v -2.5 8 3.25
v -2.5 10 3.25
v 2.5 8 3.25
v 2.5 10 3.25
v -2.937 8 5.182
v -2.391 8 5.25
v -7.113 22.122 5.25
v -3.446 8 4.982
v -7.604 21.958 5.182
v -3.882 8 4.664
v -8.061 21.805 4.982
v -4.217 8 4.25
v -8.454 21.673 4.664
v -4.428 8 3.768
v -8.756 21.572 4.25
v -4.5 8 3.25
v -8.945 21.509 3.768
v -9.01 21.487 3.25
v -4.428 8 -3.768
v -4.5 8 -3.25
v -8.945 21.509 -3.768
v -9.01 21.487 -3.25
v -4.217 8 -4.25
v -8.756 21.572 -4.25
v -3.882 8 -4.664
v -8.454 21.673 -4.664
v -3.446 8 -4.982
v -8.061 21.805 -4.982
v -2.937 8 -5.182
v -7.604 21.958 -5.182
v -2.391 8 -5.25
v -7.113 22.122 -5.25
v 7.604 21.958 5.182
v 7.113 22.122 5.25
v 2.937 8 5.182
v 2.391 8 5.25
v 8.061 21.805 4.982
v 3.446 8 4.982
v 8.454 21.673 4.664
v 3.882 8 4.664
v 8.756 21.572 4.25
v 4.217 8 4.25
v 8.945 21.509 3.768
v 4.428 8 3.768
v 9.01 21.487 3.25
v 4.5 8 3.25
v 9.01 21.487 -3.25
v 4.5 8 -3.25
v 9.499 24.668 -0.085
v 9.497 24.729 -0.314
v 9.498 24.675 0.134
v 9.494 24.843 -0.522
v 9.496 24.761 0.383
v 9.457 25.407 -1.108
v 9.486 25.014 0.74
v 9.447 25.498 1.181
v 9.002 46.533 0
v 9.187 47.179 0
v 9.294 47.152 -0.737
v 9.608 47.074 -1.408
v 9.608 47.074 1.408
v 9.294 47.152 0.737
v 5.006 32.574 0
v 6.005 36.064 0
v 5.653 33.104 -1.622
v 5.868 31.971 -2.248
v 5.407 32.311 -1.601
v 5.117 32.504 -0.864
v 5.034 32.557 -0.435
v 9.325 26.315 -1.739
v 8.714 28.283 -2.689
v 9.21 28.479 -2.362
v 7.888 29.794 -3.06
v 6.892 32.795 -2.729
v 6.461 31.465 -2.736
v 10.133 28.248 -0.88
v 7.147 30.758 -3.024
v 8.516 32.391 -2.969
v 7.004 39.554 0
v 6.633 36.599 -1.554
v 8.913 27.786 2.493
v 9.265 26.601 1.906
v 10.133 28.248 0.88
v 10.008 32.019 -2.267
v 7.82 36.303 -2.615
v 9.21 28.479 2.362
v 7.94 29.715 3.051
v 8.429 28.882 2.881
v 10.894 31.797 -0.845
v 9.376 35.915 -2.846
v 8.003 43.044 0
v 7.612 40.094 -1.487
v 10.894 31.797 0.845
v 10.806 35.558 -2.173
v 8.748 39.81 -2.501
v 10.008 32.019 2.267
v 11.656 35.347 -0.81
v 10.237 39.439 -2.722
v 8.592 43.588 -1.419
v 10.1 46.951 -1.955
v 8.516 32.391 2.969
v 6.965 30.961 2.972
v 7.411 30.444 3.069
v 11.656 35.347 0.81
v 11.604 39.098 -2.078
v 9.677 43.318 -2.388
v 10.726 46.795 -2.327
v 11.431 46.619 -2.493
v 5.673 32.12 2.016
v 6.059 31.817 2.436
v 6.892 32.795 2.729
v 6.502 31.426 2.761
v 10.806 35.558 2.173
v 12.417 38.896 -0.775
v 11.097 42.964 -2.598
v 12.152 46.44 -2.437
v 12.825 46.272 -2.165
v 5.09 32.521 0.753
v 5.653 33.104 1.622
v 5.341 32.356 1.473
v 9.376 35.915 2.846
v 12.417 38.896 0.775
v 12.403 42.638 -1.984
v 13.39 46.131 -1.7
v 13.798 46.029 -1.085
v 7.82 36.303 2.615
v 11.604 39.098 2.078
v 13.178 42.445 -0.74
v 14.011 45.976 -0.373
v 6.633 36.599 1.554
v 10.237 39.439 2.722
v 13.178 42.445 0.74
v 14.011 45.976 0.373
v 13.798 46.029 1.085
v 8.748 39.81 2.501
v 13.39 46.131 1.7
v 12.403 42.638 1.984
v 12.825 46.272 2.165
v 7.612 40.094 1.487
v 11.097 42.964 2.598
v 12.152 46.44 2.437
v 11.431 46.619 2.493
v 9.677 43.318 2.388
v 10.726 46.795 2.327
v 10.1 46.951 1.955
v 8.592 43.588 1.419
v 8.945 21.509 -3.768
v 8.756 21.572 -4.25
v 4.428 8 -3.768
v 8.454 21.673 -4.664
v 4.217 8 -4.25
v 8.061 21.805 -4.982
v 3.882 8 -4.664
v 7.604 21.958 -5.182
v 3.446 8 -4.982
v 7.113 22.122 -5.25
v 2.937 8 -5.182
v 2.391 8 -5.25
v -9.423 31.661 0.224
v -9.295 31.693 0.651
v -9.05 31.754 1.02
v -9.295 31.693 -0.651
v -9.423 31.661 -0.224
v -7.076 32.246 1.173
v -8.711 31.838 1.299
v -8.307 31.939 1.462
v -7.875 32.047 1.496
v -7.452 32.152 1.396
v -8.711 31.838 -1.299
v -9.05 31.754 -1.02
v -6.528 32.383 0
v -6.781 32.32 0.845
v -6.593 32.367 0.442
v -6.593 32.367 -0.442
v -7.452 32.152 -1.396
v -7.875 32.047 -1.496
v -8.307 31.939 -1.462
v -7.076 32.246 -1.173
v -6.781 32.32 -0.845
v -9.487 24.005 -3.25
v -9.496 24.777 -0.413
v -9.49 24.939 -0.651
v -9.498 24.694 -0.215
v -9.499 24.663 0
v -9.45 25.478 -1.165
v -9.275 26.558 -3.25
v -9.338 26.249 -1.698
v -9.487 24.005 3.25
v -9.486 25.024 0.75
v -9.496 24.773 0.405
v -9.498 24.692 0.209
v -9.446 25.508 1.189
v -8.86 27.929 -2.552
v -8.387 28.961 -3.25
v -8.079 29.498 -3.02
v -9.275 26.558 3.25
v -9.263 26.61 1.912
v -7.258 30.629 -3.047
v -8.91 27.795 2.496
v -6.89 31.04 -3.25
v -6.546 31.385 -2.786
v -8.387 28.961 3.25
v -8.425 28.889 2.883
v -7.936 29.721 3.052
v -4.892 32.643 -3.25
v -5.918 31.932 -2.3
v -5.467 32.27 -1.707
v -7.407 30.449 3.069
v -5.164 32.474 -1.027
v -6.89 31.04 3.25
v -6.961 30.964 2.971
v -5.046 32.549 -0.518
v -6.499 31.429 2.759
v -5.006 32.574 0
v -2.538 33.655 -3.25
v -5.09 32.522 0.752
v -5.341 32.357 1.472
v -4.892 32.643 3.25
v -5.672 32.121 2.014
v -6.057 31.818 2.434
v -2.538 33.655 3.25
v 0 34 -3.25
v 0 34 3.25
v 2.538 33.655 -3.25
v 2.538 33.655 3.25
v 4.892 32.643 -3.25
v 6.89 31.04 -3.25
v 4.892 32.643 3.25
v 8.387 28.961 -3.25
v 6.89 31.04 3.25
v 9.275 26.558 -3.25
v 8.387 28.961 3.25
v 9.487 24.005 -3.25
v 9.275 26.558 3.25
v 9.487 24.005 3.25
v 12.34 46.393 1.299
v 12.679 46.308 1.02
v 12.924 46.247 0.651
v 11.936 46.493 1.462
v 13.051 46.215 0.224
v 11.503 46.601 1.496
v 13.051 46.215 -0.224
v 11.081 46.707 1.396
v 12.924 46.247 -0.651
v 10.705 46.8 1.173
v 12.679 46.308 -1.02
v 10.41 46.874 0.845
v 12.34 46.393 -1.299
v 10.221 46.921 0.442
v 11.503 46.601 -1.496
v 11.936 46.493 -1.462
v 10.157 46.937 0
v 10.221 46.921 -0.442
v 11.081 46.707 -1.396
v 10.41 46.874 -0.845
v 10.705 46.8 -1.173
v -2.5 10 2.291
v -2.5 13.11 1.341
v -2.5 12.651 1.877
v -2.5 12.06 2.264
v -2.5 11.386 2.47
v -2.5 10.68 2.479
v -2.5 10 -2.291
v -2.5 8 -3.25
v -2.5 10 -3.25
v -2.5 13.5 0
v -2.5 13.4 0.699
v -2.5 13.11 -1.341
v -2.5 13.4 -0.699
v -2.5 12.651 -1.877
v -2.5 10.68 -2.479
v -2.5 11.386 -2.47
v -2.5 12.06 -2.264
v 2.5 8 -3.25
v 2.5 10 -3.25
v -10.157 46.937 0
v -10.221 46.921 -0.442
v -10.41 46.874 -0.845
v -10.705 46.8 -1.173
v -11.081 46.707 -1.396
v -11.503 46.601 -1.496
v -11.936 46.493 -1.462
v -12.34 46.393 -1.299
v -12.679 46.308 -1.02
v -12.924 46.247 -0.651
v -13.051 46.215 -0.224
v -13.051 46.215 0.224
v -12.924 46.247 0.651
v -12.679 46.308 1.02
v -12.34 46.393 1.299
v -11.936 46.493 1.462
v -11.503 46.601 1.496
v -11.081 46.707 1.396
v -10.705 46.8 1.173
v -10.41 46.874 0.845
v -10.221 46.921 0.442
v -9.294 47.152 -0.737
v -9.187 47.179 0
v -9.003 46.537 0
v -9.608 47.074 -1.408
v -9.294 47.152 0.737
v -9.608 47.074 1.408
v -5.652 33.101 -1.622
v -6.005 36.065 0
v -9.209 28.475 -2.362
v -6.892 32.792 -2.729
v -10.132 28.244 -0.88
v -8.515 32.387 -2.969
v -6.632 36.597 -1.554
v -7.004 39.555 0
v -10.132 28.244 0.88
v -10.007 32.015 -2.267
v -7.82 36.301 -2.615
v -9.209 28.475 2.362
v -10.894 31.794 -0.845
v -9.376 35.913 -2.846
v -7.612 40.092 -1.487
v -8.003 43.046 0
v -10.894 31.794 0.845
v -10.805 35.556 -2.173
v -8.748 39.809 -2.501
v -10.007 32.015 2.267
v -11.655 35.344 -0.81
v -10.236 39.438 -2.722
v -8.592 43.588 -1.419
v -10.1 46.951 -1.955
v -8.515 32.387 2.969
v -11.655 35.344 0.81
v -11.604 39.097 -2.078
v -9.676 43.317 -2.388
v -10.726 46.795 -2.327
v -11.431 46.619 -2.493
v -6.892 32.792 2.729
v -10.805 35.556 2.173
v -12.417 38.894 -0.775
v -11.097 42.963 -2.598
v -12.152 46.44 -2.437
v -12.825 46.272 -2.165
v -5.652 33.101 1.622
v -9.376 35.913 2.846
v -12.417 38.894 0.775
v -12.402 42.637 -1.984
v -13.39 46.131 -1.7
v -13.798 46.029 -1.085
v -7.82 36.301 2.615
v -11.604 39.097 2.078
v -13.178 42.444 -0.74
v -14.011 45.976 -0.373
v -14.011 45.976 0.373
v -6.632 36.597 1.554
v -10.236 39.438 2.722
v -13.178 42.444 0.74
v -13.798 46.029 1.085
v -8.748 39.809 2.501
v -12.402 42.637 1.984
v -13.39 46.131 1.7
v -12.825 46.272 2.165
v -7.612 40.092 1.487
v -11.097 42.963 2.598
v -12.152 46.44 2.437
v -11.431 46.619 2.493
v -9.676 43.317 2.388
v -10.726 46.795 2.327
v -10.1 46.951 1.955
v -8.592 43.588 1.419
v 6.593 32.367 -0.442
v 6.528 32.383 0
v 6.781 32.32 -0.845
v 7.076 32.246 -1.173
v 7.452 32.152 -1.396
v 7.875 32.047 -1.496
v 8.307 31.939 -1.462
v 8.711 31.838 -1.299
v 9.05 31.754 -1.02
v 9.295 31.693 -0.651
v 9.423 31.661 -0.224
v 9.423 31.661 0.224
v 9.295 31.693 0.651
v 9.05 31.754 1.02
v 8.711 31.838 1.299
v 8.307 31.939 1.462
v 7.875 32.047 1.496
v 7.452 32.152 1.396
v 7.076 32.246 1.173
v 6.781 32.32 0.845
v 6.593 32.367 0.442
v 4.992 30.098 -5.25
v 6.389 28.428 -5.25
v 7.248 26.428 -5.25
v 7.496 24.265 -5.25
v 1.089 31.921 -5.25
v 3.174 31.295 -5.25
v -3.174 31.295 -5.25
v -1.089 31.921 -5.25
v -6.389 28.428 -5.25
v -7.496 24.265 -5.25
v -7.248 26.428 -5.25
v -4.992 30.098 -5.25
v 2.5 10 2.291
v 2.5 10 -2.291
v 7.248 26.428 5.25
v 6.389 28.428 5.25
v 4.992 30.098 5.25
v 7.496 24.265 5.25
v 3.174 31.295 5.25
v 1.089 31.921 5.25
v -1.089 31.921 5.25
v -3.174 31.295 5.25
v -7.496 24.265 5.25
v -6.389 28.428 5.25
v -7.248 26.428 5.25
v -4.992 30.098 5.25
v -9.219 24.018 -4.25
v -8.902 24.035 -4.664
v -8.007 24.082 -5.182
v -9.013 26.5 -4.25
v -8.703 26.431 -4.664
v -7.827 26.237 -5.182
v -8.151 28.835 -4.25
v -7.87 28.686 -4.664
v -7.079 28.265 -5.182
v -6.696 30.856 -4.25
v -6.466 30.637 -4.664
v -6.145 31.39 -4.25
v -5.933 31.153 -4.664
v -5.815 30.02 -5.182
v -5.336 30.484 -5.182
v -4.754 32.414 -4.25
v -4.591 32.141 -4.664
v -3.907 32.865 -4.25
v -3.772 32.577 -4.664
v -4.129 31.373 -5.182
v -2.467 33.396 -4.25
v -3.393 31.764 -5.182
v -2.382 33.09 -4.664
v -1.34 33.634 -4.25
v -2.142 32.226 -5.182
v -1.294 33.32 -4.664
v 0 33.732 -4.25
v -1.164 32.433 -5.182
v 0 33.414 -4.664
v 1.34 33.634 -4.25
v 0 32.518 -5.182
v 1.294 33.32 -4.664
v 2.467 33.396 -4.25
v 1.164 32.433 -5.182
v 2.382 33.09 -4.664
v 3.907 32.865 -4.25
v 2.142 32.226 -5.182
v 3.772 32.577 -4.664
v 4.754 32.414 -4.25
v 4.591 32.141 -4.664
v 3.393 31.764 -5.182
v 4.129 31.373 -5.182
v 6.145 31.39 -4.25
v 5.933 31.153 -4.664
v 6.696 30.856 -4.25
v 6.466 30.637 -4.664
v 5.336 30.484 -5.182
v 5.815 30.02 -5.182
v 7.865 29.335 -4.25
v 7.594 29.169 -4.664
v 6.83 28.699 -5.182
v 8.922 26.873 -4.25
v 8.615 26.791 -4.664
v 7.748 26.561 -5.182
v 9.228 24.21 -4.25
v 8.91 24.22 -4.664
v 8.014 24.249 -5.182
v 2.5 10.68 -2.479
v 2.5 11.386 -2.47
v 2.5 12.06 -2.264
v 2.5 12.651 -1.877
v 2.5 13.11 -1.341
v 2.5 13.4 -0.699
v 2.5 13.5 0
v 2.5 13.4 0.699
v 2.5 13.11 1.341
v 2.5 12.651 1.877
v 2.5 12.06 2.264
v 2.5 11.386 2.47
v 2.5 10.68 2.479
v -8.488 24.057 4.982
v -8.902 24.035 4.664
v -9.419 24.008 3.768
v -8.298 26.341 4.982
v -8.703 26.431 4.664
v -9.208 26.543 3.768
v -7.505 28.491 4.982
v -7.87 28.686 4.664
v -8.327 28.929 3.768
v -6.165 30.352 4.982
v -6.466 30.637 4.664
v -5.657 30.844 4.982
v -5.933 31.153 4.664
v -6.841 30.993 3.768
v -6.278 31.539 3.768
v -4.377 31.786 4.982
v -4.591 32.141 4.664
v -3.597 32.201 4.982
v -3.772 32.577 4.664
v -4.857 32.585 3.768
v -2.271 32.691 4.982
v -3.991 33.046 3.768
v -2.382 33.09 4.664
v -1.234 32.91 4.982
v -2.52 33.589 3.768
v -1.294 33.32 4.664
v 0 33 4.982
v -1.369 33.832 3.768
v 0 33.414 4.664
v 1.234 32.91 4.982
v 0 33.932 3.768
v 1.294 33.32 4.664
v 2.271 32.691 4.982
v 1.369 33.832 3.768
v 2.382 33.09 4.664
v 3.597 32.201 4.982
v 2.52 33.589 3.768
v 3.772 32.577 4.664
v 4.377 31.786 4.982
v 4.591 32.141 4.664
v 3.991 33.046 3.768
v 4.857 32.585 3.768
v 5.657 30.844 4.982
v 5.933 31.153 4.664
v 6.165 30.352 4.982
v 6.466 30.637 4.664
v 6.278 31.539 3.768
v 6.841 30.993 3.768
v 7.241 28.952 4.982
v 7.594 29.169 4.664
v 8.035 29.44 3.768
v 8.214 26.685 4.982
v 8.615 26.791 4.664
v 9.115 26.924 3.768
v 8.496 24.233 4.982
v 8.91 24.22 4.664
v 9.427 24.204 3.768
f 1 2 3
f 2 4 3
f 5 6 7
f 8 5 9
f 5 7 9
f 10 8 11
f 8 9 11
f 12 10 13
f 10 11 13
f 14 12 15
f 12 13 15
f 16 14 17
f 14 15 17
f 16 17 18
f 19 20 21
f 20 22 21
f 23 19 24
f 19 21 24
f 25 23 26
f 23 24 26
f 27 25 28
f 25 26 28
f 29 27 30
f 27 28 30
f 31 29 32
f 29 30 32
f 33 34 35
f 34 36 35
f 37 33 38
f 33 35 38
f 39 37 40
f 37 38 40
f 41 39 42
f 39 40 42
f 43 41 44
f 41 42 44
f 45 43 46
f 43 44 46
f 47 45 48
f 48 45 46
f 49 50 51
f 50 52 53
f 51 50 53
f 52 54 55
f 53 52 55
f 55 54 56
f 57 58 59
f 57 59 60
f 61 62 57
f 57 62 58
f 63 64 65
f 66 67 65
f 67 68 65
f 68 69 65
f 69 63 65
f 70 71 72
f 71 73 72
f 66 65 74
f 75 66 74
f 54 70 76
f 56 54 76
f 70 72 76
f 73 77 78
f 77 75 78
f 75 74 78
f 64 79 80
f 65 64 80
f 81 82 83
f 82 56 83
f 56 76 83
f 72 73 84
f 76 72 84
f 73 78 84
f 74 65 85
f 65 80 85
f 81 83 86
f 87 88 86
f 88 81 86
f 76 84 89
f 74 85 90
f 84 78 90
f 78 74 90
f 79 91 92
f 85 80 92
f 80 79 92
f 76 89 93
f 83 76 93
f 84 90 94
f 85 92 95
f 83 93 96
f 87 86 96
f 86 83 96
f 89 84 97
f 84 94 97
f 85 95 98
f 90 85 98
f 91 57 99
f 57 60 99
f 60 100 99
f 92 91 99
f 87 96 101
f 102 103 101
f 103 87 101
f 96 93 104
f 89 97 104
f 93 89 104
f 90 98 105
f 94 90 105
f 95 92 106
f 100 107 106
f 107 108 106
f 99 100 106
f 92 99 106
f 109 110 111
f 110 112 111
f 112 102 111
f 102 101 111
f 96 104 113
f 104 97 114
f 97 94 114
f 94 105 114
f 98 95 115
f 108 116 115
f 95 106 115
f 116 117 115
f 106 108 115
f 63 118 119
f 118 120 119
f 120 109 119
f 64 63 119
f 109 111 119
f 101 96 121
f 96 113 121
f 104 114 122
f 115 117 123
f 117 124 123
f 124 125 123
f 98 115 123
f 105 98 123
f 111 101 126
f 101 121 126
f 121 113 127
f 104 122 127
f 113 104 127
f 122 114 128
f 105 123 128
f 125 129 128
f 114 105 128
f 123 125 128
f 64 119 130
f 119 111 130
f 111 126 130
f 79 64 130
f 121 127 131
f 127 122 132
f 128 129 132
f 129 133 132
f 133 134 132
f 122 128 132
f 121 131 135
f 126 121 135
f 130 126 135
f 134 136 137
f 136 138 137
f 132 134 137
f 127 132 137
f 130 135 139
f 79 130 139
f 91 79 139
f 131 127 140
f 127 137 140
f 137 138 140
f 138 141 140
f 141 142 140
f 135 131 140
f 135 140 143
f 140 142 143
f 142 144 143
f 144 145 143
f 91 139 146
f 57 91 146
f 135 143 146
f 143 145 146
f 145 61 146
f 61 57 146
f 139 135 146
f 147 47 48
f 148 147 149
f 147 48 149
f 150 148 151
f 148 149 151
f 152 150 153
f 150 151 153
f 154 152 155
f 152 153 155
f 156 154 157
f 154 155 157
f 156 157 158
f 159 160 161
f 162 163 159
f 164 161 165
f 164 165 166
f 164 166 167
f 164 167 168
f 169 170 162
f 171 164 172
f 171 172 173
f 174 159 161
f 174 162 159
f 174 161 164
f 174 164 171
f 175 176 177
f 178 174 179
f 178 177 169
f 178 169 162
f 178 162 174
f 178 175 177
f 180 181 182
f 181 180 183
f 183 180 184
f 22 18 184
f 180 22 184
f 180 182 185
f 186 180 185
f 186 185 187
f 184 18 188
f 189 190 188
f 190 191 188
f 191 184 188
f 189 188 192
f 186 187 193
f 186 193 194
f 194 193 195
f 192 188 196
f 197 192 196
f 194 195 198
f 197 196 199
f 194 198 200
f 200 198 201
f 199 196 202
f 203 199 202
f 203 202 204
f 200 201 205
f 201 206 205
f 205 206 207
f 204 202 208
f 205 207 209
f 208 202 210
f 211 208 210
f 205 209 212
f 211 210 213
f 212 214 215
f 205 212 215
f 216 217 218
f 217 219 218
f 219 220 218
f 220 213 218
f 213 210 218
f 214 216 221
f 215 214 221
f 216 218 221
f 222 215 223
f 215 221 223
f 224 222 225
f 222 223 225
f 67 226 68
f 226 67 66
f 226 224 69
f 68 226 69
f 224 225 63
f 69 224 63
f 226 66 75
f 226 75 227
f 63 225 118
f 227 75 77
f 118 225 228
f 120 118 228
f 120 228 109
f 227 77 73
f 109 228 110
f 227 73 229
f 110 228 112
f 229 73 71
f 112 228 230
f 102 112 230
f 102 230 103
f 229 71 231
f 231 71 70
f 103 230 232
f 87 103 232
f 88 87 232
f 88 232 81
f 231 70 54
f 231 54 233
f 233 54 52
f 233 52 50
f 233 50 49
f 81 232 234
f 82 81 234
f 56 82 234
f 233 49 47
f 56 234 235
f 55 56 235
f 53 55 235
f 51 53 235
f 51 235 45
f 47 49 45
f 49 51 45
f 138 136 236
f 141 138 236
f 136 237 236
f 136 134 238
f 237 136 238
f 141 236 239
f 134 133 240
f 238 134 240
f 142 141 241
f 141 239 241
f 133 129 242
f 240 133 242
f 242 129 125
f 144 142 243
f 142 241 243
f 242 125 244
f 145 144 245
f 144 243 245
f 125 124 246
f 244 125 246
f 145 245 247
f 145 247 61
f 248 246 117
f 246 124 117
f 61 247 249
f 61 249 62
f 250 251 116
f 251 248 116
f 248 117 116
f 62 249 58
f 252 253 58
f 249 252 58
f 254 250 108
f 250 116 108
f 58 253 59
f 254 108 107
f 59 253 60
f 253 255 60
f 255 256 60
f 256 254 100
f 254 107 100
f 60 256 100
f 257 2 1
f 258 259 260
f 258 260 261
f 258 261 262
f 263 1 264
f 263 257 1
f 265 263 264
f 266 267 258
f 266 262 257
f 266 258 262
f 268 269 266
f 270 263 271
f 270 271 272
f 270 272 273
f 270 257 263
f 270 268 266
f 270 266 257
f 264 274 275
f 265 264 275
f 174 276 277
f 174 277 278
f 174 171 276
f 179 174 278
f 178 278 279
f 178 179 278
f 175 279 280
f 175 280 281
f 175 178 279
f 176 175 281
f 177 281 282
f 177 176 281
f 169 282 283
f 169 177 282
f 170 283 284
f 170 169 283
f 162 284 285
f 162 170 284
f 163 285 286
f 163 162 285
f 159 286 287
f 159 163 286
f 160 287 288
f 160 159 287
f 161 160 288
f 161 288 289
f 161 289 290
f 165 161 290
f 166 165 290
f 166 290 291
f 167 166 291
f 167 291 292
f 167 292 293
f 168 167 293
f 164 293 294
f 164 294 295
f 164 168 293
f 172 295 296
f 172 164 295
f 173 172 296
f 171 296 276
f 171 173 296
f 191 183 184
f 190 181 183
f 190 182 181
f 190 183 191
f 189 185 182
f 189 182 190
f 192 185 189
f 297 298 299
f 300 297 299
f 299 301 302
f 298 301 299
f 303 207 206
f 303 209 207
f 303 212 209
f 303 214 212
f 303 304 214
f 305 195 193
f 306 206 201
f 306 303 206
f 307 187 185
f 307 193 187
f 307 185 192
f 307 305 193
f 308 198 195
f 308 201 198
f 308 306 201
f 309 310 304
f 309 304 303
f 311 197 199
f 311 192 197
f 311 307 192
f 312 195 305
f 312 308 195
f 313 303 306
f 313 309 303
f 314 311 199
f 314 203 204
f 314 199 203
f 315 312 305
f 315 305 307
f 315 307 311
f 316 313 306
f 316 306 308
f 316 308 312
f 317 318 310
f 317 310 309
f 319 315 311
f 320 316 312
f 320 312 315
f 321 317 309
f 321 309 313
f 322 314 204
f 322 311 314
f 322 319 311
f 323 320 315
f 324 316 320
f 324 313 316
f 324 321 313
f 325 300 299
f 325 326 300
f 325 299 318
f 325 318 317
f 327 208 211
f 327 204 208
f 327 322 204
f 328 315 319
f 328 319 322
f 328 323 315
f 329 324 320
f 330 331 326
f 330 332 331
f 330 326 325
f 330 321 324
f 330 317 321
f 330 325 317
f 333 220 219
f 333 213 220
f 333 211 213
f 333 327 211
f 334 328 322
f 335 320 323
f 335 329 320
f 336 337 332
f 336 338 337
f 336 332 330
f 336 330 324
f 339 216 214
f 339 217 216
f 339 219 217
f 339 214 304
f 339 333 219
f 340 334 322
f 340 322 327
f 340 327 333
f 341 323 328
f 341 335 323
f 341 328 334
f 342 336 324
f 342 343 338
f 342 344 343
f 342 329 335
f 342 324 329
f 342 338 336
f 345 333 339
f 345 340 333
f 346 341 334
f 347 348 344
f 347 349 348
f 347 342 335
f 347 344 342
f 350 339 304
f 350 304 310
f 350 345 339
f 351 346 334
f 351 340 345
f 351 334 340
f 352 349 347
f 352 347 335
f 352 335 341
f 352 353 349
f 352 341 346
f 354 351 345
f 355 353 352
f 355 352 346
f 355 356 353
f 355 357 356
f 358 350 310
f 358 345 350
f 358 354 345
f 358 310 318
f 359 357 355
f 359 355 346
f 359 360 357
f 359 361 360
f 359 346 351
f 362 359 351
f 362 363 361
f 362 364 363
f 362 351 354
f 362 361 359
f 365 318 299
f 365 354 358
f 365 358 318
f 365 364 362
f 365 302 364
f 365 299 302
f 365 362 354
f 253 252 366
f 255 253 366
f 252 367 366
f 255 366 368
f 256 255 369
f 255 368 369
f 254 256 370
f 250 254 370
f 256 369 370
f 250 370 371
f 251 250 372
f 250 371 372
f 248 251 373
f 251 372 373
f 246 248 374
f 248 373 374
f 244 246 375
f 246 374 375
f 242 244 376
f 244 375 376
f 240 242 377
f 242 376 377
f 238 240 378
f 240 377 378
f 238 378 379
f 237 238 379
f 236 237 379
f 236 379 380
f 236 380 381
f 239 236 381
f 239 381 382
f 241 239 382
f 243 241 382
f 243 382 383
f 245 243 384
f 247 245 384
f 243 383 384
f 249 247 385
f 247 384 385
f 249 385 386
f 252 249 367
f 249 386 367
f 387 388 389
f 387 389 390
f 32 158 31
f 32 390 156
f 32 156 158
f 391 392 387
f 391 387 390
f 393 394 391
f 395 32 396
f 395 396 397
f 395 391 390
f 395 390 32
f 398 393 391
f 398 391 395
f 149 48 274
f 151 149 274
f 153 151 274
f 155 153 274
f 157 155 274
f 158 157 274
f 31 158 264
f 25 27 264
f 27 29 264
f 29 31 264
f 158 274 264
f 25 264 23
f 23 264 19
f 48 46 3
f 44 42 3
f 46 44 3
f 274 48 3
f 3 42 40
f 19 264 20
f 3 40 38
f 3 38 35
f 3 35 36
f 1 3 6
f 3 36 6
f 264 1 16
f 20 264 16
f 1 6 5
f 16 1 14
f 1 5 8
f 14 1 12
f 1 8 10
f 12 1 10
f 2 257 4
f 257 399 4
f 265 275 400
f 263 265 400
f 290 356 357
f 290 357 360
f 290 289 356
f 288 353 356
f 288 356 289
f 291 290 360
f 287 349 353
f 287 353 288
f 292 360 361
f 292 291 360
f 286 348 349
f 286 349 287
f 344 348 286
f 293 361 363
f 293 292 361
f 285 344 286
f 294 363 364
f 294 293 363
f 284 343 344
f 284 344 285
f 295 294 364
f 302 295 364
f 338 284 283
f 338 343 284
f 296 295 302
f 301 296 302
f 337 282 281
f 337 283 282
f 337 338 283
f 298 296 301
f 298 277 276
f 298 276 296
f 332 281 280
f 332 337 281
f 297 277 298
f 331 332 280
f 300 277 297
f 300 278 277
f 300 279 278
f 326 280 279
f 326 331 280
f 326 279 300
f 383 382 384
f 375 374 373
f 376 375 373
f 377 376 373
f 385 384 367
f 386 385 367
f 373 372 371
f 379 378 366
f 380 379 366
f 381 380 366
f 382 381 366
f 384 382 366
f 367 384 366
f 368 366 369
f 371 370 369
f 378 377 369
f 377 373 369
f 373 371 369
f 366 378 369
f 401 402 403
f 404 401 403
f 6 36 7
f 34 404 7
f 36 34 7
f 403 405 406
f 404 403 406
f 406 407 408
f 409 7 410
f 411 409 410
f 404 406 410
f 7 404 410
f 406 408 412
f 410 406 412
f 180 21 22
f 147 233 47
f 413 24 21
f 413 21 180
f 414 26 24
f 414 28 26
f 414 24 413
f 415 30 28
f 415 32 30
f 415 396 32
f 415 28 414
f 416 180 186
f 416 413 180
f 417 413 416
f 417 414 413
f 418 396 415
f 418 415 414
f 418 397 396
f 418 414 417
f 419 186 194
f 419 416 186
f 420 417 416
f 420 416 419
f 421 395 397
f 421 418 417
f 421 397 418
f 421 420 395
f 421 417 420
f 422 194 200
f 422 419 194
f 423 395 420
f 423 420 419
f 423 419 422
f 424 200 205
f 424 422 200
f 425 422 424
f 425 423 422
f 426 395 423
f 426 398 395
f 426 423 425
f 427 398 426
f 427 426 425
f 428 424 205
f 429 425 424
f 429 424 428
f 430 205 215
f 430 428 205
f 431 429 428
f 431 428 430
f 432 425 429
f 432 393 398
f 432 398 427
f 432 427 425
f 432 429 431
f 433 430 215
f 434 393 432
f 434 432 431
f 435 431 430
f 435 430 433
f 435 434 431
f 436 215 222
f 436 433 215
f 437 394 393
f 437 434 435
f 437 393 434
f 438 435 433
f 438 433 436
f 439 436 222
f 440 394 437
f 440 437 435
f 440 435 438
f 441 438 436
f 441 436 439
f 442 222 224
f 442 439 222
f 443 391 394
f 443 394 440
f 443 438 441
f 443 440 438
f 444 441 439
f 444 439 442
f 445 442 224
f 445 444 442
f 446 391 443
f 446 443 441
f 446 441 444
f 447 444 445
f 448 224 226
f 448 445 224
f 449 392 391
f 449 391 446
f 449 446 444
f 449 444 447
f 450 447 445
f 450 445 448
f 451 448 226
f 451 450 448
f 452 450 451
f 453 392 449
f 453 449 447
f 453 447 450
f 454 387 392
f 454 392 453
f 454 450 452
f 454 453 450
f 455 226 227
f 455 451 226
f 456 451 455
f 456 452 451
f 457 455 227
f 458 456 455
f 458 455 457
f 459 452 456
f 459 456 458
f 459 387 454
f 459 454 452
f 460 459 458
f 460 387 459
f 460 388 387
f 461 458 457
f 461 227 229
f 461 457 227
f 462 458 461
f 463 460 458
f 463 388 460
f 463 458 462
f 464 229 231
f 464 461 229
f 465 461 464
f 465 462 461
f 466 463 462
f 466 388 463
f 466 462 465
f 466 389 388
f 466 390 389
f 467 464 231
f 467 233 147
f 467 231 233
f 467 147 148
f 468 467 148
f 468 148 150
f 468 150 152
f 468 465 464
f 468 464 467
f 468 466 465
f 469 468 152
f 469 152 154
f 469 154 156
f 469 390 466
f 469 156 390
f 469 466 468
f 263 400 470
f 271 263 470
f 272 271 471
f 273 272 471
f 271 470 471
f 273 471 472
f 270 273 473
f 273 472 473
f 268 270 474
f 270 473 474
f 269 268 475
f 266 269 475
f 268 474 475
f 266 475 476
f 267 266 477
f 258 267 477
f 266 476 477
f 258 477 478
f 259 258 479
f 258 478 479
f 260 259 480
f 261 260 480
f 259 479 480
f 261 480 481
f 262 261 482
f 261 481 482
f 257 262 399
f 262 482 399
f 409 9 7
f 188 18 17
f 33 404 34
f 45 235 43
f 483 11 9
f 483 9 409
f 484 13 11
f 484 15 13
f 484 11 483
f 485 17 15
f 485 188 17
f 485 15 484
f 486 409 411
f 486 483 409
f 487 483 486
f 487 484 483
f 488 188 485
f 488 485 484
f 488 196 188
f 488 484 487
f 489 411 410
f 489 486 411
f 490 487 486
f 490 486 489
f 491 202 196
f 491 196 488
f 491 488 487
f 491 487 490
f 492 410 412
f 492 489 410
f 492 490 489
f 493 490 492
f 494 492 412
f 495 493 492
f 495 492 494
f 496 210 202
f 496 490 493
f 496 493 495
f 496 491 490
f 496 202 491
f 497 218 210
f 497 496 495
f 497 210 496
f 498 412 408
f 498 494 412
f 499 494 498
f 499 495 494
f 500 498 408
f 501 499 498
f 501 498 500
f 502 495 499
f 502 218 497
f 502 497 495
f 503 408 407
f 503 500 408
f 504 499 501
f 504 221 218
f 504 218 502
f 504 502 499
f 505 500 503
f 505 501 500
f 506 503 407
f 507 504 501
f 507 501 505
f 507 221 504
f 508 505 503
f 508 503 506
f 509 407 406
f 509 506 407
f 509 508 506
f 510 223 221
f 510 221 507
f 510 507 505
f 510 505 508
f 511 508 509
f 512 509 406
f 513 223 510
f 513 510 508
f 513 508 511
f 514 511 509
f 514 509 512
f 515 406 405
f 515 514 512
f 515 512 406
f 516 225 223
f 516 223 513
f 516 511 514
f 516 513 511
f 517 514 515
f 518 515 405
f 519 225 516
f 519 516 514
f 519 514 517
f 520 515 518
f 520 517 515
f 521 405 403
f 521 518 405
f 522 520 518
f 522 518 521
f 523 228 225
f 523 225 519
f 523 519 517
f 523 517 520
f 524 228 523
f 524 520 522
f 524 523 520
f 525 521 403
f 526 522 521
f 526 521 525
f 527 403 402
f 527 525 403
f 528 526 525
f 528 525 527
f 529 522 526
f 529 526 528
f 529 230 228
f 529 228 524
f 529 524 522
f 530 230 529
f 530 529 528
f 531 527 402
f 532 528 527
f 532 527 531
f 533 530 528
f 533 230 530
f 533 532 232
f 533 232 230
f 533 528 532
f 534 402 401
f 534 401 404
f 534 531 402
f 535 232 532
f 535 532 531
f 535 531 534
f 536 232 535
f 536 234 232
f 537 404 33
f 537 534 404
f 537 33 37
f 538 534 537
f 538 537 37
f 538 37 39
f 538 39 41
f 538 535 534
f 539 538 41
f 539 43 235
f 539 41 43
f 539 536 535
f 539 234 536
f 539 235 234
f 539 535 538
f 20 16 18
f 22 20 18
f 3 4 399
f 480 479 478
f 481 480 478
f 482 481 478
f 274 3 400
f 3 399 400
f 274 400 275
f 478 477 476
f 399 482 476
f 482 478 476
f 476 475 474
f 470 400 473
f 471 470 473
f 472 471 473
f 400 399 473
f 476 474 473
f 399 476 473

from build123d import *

# Parameters (mm, degrees)
EXTRUSION1_DEPTH        = 5.25
CONG_1_R                = 2
ENL_V_MAT_EXTRU_1_DEPTH = 2.5


with BuildPart() as part:
    # Esquisse1 → Extrusion1 (new body, symmetric)
    with BuildSketch(Plane.XY):
        with BuildLine():
            Line((4.5, 8), (-4.5, 8))
            Line((-4.5, 8), (-9.009706909, 21.487495824))
            ThreePointArc((-9.009706909, 21.487495824), (0, 34), (9.009706909, 21.487495824))
            Line((9.009706909, 21.487495824), (4.5, 8))
        make_face()
    extrude(amount=EXTRUSION1_DEPTH, both=True)

    # Congé1
    cong_1_edges = [part.edges().sort_by_distance(p)[0] for p in [
        (6.754853455, 14.743747912, 5.25),
        (0, 34, 5.25),
        (-6.754853455, 14.743747912, 5.25),
        (0, 34, -5.25),
        (6.754853455, 14.743747912, -5.25),
        (-6.754853455, 14.743747912, -5.25),
    ]]
    fillet(cong_1_edges, radius=CONG_1_R)

    # Esquisse3 → Révolution2 (revolve)
    with BuildSketch(Plane.XY, mode=Mode.PRIVATE) as r_volution2_sk:
        Polygon((-13.067694578, 46.211312018), (-9.438866144, 31.656876124), (-7.983422555, 32.019758967), (-6.345144878, 25.448986095), (-9.498605988, 24.662739935), (-14.037990304, 45.969390122), align=None)
    r_volution2 = revolve(r_volution2_sk.sketch.rotate(Axis((0, 0, 0), (-0.241921896, 0.970295726, 0)), 180), axis=Axis((0, 0, 0), (-0.241921896, 0.970295726, 0)))  # turned: the seam where the file's is

    # Symétrie1: Révolution2 across plane
    add(r_volution2.mirror(Plane(origin=(0, 0, 0), x_dir=(0, 0, 1), z_dir=(1, 0, 0))))

    # Esquisse5 → Enlèv. mat.-Extru.1 (cut, symmetric)
    with BuildSketch(Plane(origin=(0, 0, 0), x_dir=(0, 0, -1), z_dir=(1, 0, 0))):
        with BuildLine():
            Line((-3.25, 8), (3.25, 8))
            Line((3.25, 8), (3.25, 10))
            Line((3.25, 10), (2.291287847, 10))
            ThreePointArc((2.291287847, 10), (0, 13.5), (-2.291287847, 10))
            Line((-2.291287847, 10), (-3.25, 10))
            Line((-3.25, 10), (-3.25, 8))
        make_face()
    extrude(amount=ENL_V_MAT_EXTRU_1_DEPTH, both=True, mode=Mode.SUBTRACT)


solid = part.part
